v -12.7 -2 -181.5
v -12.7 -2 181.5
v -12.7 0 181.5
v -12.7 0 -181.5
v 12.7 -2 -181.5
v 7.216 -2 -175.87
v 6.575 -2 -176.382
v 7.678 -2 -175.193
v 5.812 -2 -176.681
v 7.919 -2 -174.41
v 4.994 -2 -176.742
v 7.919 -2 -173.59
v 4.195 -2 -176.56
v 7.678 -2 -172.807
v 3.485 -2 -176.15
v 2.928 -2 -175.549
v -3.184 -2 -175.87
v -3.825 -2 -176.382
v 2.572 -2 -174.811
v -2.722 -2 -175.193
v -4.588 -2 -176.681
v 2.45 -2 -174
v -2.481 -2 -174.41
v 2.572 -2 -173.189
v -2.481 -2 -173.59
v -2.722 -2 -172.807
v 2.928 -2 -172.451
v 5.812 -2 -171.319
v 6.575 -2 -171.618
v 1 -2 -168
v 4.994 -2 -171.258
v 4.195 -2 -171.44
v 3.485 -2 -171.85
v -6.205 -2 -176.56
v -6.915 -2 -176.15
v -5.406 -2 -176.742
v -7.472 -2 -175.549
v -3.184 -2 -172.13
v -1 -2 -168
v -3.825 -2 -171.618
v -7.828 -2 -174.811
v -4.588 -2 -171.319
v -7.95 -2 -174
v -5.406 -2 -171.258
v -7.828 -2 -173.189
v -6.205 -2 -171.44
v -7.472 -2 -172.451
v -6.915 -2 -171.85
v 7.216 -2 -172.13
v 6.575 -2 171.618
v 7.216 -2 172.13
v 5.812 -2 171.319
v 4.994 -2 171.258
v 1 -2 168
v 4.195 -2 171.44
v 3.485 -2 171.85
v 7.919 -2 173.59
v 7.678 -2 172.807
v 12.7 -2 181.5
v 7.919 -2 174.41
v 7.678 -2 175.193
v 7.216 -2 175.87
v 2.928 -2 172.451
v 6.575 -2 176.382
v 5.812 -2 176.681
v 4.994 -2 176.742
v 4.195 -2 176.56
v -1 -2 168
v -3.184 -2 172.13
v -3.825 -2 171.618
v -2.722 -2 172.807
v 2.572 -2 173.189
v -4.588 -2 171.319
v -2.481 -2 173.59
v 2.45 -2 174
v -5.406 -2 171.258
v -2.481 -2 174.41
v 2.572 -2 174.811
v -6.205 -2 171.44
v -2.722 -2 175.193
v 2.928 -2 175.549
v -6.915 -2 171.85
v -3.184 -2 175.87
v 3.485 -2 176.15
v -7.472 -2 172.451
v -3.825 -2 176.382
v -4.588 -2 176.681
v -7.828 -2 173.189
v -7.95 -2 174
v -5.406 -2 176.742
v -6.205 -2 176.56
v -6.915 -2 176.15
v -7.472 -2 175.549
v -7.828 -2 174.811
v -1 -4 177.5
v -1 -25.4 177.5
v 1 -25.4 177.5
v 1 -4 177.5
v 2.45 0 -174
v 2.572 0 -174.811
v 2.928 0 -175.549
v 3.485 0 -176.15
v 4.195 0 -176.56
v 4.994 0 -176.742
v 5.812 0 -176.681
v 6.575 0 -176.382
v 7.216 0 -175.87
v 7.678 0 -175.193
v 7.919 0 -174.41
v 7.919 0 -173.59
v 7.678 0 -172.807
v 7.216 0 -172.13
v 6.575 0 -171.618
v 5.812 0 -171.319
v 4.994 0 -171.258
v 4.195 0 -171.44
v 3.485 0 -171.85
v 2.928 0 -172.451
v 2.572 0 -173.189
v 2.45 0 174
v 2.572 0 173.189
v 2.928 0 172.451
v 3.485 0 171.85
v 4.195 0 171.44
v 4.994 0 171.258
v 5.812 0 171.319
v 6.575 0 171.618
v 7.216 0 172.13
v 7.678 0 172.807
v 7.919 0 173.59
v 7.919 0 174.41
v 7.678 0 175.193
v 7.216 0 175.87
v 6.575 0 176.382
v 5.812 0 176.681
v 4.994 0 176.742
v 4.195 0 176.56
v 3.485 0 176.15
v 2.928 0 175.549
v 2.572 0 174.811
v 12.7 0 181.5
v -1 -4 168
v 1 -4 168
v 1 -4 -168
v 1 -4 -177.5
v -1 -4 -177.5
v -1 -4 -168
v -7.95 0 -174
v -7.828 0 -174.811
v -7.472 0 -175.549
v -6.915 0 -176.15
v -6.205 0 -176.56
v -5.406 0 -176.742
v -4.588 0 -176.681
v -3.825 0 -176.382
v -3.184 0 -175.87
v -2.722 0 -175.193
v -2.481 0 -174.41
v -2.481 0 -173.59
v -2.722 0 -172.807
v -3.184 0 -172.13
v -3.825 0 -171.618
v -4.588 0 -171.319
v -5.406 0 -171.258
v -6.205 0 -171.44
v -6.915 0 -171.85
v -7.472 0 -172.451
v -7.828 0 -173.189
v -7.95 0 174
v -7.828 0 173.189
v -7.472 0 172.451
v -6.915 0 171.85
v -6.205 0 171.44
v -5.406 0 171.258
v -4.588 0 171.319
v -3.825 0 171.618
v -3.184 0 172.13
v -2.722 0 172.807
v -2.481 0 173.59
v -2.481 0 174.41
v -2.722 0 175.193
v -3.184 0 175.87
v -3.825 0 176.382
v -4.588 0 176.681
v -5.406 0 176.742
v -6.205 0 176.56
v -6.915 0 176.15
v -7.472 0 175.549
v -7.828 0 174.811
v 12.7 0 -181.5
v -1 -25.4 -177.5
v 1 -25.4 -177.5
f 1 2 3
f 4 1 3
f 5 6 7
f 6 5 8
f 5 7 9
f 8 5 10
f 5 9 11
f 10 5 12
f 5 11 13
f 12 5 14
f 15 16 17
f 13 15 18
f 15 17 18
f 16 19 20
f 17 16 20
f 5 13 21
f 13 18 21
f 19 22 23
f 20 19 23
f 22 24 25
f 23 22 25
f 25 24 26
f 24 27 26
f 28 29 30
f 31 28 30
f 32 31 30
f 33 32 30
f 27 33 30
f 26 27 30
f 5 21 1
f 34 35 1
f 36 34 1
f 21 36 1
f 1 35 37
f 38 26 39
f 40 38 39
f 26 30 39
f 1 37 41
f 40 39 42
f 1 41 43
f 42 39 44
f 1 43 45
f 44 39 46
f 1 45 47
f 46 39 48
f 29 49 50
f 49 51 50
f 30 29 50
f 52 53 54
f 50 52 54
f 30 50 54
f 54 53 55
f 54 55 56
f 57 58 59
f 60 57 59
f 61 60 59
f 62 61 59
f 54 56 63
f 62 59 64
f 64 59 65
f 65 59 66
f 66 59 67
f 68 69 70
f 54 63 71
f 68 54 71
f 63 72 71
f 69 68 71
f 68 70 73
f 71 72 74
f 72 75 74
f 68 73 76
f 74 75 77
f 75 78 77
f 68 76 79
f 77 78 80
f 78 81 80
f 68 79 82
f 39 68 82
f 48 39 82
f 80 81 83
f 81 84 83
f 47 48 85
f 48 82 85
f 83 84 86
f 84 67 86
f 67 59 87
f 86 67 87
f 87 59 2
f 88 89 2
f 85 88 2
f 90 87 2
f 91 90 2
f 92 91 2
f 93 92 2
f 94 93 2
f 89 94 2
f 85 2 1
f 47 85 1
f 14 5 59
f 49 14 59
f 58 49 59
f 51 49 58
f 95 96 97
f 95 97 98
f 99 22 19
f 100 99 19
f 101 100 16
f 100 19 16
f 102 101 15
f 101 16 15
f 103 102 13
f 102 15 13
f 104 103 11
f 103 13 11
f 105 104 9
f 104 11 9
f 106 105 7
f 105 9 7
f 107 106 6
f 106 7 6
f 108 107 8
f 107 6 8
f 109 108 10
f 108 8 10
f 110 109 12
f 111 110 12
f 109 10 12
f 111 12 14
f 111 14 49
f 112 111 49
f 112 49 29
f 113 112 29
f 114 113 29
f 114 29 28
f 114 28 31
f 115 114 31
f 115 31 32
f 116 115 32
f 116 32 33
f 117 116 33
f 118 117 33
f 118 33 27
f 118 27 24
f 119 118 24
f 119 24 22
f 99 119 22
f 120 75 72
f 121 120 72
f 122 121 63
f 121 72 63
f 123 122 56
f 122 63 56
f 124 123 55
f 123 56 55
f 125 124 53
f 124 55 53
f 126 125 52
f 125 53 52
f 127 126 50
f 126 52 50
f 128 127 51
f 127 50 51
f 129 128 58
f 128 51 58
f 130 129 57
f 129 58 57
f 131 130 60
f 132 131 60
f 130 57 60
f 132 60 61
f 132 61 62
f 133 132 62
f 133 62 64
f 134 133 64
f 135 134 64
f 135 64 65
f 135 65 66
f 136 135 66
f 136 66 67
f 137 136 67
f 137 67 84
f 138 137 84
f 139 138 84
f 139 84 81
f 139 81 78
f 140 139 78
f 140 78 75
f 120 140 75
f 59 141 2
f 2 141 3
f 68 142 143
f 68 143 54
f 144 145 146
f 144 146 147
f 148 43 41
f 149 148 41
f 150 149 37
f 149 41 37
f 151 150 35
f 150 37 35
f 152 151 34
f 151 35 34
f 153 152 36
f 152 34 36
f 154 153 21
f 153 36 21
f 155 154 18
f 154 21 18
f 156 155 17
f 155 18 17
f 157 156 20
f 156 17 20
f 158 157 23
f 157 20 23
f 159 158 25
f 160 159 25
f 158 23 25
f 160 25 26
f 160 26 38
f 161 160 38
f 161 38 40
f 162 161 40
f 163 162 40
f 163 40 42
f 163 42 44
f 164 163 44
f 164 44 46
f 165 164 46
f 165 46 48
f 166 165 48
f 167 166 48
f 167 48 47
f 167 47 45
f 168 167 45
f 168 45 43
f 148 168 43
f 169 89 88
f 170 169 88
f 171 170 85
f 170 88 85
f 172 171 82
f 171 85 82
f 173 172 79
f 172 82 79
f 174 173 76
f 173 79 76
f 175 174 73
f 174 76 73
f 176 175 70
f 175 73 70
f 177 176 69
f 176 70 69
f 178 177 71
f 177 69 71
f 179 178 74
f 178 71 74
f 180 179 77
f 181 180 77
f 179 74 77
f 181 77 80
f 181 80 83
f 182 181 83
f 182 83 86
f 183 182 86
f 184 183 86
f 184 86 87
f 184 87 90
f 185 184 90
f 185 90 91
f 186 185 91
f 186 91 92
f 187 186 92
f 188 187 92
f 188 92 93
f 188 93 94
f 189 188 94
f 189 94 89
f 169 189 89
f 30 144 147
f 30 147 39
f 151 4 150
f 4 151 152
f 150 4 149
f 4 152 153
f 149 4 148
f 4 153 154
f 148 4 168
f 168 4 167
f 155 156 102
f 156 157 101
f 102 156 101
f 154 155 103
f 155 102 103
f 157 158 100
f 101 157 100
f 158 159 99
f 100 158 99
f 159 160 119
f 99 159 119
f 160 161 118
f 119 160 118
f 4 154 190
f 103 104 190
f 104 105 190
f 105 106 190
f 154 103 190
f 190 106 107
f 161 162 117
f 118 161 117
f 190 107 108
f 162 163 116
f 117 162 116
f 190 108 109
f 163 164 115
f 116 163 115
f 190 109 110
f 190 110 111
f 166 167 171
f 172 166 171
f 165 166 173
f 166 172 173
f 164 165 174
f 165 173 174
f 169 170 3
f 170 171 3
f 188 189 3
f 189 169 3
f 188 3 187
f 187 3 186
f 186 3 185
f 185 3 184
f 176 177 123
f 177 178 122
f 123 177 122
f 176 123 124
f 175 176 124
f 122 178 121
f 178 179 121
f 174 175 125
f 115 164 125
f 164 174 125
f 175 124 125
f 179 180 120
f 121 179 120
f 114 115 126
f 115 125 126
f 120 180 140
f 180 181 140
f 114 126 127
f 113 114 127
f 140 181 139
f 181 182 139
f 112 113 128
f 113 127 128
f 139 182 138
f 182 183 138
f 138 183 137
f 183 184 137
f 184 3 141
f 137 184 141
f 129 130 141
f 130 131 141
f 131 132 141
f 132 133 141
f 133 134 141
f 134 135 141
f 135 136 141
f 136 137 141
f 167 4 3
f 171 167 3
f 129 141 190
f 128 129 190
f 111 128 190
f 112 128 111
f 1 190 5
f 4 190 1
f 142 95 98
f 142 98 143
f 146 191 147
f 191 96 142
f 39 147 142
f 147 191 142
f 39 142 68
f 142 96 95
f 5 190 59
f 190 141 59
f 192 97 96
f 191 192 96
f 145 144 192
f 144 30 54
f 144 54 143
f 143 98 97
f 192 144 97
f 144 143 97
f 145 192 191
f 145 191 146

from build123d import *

# Parameters (mm, degrees)
RESSALTO_EXTRUS_O1_DEPTH     = 181.5
CORTE_EXTRUS_O2_DEPTH        = 50
FURO_DE_DI_METRO_5_5_5_5_1_D = 5.5


with BuildPart() as part:
    # Esboço1 → Ressalto-extrusão1 (new, symmetric)
    with BuildSketch(Plane.XY):
        Polygon((-12.7, 0), (12.7, 0), (12.7, -2), (1, -2), (1, -25.4), (-1, -25.4), (-1, -2), (-12.7, -2), align=None)
    extrude(amount=RESSALTO_EXTRUS_O1_DEPTH, both=True)

    # Esboço3 → Corte-extrusão2 (cut, symmetric)
    with BuildSketch(Plane(origin=(0, 0, 0), x_dir=(0, 0, -1), z_dir=(1, 0, 0))):
        Polygon((-177.5, -4), (-168, -4), (-168, -2), (-181.5, -2), (-181.5, -25.4), (-177.5, -25.4), align=None)
        Polygon((181.5, -25.4), (177.5, -25.4), (177.5, -4), (168, -4), (168, -2), (181.5, -2), align=None)
    extrude(amount=CORTE_EXTRUS_O2_DEPTH, both=True, mode=Mode.SUBTRACT)

    # Furo de diâmetro Ø5.5 (5.5)1 (through all)
    with Locations(Plane(origin=(0, 0, 0), x_dir=(1, 0, 0), z_dir=(0, 1, 0))):
        with Locations((5.2, -174), (-5.2, -174), (-5.2, 174), (5.2, 174)):
            Hole(FURO_DE_DI_METRO_5_5_5_5_1_D / 2)


solid = part.part
